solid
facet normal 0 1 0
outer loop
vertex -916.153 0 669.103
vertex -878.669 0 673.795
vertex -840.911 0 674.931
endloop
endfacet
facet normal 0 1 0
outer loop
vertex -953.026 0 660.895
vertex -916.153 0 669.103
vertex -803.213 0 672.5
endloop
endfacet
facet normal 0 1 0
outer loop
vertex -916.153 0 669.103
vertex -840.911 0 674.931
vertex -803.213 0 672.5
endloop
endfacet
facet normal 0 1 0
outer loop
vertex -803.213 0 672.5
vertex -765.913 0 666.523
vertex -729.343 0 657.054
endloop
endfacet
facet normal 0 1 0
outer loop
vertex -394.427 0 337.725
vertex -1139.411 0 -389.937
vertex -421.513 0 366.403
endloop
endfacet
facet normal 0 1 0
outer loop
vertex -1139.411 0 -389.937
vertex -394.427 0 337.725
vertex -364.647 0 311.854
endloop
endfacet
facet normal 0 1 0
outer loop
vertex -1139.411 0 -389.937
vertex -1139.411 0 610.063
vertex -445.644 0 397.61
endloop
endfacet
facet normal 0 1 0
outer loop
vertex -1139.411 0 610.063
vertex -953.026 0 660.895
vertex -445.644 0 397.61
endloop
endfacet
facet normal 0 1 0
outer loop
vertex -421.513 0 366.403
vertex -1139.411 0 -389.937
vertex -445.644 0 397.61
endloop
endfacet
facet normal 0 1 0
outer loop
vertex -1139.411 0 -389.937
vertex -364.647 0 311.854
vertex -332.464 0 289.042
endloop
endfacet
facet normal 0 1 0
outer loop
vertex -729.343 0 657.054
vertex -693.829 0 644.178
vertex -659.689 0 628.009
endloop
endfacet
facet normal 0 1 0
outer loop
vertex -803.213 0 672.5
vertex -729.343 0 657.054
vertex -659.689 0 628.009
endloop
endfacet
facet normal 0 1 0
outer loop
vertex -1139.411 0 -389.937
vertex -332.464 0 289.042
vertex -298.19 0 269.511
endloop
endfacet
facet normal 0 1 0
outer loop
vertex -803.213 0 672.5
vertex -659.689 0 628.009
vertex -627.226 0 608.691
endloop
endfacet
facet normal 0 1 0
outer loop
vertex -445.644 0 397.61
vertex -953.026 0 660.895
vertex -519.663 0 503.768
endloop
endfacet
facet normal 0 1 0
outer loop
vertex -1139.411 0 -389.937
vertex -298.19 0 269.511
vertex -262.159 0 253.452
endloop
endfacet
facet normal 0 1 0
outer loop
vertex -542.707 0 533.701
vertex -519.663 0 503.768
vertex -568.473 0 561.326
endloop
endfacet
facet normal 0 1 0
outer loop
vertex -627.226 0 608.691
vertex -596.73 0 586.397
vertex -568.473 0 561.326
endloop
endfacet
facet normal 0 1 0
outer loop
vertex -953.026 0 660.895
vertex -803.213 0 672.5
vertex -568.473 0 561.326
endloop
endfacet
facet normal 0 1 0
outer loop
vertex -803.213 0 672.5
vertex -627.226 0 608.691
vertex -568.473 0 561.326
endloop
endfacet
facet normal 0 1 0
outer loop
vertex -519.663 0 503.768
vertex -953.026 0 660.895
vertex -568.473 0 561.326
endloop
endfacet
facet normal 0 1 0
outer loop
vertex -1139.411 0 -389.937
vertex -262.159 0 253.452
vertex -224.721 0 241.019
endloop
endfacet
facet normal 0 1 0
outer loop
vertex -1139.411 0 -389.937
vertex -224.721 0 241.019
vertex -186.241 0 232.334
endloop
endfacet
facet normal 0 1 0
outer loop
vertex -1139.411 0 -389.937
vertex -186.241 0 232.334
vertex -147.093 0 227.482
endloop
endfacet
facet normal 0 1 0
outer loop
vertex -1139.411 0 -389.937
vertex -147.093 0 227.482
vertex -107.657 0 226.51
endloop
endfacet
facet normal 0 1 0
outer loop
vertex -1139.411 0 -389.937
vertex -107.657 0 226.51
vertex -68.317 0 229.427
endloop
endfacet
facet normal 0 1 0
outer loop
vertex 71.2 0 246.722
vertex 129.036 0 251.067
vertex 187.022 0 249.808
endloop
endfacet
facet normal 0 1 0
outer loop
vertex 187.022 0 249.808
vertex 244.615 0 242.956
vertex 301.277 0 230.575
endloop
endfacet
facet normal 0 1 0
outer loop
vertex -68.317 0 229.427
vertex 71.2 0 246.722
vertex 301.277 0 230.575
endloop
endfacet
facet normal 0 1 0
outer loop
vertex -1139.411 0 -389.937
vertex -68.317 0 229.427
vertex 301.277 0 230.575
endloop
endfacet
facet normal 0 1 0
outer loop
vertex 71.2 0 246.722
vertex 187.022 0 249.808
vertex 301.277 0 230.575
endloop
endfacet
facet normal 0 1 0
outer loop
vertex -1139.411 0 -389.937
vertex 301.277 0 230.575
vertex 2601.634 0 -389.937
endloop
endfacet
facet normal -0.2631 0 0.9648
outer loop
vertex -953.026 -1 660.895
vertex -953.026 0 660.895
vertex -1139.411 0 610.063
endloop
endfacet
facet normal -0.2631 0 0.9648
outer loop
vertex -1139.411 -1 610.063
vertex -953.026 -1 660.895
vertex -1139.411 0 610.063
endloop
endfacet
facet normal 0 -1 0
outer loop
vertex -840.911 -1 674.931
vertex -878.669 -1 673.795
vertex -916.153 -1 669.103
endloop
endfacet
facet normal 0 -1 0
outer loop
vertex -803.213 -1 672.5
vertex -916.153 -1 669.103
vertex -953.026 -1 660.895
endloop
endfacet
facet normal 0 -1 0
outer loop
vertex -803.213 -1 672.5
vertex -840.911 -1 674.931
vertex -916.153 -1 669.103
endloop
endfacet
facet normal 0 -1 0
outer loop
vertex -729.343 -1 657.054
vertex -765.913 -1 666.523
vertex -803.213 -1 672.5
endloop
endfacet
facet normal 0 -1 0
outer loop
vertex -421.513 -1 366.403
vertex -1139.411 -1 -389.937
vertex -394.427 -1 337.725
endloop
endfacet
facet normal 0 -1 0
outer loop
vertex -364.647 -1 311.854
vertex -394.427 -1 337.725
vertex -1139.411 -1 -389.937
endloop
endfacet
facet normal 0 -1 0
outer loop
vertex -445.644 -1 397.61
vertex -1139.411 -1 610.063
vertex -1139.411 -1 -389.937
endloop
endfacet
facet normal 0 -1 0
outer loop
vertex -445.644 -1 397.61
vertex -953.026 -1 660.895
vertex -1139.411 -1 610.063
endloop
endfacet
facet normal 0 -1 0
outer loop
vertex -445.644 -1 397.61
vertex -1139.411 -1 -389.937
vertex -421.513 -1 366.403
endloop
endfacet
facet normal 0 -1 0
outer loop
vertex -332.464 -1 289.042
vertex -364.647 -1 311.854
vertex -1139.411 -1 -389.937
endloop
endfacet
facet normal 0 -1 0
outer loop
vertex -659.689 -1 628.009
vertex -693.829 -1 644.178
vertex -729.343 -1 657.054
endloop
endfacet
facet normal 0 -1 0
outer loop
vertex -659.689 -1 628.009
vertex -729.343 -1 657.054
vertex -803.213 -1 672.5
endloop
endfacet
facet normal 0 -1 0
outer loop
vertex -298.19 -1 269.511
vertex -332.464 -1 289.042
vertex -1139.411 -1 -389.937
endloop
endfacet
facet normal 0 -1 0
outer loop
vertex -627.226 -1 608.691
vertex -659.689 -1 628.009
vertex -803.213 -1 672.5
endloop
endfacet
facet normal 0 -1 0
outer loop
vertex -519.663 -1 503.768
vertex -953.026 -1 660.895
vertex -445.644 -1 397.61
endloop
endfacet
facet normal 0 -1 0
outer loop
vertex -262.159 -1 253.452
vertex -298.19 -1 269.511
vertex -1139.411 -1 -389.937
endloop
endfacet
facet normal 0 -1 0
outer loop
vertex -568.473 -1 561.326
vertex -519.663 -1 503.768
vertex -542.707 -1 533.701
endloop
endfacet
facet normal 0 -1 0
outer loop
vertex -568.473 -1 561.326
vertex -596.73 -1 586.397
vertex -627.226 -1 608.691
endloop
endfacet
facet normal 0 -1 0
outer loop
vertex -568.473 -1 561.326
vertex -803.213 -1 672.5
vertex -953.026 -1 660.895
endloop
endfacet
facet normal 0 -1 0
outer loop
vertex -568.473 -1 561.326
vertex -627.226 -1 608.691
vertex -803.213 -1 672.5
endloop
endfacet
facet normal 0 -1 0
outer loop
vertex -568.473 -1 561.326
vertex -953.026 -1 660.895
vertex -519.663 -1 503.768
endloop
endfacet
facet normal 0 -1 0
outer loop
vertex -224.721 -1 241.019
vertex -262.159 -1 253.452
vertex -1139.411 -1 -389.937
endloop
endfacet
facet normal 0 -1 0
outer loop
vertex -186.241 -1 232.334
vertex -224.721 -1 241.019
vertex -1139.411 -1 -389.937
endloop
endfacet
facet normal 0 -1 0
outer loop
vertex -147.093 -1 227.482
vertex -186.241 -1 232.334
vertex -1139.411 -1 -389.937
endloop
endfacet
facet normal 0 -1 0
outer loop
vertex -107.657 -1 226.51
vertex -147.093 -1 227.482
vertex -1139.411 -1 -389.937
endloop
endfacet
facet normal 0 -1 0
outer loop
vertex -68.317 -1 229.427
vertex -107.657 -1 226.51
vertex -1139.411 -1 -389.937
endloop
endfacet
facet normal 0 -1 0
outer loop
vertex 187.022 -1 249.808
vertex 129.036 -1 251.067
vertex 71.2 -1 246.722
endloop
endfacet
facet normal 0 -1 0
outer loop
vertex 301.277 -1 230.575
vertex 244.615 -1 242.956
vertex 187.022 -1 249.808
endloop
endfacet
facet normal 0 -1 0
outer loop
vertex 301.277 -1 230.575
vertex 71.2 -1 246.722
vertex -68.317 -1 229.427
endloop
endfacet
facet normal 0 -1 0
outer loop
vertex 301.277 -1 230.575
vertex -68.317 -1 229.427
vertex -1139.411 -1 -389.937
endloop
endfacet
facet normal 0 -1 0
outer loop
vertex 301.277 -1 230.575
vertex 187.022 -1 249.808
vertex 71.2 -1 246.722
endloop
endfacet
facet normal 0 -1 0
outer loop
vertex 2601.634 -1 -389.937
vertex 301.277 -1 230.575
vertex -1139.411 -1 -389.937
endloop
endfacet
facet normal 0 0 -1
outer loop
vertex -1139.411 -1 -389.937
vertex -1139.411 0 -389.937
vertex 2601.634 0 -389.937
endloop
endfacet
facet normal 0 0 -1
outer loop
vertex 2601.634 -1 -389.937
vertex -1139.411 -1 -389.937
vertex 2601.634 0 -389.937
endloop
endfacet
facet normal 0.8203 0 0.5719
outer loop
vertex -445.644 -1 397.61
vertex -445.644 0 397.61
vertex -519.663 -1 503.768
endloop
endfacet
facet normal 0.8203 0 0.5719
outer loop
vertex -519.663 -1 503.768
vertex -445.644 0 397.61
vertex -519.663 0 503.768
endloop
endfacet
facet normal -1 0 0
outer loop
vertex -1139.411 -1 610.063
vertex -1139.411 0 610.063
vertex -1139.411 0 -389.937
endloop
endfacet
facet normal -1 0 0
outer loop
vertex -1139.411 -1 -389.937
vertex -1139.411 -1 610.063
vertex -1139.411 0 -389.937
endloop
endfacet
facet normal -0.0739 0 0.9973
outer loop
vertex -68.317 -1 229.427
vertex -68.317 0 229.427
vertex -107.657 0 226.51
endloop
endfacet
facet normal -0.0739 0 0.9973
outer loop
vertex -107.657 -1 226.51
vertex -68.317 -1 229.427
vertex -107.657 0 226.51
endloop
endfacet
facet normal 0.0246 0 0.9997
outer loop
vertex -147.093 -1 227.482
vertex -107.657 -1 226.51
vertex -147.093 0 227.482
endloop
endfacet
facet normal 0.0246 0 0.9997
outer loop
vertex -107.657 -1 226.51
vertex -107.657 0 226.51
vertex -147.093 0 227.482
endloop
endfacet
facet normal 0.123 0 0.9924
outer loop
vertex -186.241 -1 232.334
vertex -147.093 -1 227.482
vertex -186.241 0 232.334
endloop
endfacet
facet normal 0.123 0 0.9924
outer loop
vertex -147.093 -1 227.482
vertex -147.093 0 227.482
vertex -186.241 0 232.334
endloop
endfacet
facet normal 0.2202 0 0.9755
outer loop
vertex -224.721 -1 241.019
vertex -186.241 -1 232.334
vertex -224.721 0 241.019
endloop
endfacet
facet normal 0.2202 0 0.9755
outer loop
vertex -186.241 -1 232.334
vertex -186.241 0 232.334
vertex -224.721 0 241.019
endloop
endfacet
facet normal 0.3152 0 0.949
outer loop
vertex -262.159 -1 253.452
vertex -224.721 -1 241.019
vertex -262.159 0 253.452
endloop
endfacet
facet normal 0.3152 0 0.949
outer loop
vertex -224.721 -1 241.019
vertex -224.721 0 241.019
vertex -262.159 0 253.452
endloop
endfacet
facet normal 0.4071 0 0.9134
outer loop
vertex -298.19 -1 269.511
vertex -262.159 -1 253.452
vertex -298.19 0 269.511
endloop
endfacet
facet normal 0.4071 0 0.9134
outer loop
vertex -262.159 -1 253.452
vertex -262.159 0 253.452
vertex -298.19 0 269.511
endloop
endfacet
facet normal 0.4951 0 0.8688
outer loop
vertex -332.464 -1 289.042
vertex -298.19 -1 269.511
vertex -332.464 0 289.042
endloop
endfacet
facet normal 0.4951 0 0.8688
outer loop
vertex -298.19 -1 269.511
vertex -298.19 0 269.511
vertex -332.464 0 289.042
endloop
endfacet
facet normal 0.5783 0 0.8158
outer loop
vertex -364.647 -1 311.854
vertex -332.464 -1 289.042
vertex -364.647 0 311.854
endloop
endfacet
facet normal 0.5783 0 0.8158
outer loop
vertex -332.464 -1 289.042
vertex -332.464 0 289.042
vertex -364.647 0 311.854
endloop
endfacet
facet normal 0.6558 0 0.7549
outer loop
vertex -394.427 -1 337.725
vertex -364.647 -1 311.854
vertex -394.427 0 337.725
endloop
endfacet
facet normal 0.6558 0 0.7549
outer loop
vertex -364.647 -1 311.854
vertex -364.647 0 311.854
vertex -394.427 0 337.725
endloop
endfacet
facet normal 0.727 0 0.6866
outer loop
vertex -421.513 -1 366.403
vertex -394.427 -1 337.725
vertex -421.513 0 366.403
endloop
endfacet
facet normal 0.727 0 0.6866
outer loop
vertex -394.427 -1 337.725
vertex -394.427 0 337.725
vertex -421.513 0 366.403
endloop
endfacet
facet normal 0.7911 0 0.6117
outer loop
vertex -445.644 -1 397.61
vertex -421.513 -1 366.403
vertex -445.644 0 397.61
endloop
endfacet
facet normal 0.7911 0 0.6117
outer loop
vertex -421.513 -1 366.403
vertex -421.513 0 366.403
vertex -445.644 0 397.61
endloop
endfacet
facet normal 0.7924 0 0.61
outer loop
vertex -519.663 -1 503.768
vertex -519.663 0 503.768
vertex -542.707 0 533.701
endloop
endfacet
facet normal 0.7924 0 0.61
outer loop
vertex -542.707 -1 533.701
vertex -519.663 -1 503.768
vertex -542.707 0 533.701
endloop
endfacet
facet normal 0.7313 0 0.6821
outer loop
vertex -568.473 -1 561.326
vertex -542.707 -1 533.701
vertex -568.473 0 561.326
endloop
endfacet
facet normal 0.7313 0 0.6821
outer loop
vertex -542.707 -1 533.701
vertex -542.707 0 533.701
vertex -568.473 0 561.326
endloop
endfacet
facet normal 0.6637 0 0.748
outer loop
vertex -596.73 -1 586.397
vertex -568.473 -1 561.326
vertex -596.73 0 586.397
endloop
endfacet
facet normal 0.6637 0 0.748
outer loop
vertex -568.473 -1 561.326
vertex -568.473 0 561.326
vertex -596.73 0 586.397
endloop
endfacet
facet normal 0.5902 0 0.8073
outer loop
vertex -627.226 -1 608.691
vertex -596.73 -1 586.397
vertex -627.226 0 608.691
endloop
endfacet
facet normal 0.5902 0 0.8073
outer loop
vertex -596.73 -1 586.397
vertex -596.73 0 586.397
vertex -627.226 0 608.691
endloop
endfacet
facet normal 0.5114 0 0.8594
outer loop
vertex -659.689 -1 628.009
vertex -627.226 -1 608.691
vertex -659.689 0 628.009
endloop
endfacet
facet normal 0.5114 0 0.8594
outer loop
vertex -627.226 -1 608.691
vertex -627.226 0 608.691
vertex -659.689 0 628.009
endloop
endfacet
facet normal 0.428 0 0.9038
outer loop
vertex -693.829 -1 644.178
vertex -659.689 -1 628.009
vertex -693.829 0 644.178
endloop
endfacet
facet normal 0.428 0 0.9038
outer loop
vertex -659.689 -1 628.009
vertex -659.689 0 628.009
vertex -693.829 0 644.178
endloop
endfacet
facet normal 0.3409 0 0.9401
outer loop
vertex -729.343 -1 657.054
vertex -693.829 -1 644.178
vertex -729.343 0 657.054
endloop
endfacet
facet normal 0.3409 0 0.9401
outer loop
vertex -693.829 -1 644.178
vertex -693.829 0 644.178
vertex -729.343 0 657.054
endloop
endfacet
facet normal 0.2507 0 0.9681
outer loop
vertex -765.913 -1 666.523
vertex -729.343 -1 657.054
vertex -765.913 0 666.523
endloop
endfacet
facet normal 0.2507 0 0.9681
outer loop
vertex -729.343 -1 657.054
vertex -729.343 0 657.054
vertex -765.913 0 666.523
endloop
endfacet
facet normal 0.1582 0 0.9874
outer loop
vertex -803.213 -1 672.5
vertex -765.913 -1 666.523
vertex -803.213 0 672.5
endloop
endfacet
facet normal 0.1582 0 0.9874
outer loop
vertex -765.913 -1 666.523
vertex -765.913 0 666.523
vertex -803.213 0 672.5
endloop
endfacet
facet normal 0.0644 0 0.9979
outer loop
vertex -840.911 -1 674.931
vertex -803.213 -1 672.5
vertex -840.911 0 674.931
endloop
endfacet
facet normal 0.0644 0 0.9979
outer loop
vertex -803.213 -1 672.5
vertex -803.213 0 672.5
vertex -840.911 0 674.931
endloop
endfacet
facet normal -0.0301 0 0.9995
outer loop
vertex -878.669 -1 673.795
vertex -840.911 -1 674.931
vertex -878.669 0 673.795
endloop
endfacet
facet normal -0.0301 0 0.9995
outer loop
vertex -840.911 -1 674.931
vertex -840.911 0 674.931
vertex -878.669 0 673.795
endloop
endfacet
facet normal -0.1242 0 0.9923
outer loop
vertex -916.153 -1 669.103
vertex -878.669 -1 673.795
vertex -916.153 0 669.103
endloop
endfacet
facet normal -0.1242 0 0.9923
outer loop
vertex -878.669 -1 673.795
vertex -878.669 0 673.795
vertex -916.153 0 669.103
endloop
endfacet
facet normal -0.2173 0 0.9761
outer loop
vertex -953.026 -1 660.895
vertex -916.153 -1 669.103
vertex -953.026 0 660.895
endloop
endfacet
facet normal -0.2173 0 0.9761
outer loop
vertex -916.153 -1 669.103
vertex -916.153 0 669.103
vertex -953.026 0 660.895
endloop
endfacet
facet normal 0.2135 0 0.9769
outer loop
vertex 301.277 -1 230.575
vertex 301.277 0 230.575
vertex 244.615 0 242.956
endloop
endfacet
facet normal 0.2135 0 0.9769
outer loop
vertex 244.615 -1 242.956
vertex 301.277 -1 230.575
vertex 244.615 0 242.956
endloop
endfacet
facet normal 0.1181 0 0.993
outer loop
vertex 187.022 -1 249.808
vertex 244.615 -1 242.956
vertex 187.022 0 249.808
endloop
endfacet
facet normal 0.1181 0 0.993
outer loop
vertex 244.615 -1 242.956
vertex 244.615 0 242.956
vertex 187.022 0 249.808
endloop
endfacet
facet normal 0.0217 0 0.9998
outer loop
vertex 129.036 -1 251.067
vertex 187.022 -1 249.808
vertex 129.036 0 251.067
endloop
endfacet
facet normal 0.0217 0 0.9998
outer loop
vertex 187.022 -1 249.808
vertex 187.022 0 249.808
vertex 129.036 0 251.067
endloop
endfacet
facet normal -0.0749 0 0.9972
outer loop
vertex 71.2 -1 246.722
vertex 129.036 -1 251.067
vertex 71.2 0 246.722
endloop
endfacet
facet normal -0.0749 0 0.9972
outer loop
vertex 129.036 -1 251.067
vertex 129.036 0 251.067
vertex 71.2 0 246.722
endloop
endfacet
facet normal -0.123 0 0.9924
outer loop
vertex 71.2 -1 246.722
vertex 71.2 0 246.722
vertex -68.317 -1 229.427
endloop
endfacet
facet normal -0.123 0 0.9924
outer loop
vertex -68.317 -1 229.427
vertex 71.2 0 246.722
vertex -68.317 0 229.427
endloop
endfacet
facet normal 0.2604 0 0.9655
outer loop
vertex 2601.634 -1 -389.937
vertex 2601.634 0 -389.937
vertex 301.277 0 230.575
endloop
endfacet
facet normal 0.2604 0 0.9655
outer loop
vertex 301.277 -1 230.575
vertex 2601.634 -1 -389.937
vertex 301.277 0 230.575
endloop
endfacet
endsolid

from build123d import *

# Parameters (mm, degrees)
F1_DEPTH = 1


with BuildPart() as f1:
    # F0 (on Front) → F1 (new body)
    with BuildSketch(Plane.XZ):
        with BuildLine():
            Line((-1139.410854, 610.063225), (-1139.410854, -389.936775))
            Line((-1139.410854, -389.936775), (2601.634026, -389.936775))
            Line((2601.634026, -389.936775), (301.27737, 230.574696))
            ThreePointArc((301.27737, 230.574696), (187.021902, 249.80792), (71.200021, 246.722329))
            Line((71.200021, 246.722329), (-68.31717, 229.426816))
            ThreePointArc((-68.31717, 229.426816), (-280.372468, 261.037127), (-445.643695, 397.609753))
            Line((-445.643695, 397.609753), (-519.662595, 503.76842))
            ThreePointArc((-519.662595, 503.76842), (-711.434164, 651.035244), (-953.026027, 660.89546))
            Line((-953.026027, 660.89546), (-1139.410854, 610.063225))
        make_face()
    extrude(amount=F1_DEPTH)


solid = f1.part
